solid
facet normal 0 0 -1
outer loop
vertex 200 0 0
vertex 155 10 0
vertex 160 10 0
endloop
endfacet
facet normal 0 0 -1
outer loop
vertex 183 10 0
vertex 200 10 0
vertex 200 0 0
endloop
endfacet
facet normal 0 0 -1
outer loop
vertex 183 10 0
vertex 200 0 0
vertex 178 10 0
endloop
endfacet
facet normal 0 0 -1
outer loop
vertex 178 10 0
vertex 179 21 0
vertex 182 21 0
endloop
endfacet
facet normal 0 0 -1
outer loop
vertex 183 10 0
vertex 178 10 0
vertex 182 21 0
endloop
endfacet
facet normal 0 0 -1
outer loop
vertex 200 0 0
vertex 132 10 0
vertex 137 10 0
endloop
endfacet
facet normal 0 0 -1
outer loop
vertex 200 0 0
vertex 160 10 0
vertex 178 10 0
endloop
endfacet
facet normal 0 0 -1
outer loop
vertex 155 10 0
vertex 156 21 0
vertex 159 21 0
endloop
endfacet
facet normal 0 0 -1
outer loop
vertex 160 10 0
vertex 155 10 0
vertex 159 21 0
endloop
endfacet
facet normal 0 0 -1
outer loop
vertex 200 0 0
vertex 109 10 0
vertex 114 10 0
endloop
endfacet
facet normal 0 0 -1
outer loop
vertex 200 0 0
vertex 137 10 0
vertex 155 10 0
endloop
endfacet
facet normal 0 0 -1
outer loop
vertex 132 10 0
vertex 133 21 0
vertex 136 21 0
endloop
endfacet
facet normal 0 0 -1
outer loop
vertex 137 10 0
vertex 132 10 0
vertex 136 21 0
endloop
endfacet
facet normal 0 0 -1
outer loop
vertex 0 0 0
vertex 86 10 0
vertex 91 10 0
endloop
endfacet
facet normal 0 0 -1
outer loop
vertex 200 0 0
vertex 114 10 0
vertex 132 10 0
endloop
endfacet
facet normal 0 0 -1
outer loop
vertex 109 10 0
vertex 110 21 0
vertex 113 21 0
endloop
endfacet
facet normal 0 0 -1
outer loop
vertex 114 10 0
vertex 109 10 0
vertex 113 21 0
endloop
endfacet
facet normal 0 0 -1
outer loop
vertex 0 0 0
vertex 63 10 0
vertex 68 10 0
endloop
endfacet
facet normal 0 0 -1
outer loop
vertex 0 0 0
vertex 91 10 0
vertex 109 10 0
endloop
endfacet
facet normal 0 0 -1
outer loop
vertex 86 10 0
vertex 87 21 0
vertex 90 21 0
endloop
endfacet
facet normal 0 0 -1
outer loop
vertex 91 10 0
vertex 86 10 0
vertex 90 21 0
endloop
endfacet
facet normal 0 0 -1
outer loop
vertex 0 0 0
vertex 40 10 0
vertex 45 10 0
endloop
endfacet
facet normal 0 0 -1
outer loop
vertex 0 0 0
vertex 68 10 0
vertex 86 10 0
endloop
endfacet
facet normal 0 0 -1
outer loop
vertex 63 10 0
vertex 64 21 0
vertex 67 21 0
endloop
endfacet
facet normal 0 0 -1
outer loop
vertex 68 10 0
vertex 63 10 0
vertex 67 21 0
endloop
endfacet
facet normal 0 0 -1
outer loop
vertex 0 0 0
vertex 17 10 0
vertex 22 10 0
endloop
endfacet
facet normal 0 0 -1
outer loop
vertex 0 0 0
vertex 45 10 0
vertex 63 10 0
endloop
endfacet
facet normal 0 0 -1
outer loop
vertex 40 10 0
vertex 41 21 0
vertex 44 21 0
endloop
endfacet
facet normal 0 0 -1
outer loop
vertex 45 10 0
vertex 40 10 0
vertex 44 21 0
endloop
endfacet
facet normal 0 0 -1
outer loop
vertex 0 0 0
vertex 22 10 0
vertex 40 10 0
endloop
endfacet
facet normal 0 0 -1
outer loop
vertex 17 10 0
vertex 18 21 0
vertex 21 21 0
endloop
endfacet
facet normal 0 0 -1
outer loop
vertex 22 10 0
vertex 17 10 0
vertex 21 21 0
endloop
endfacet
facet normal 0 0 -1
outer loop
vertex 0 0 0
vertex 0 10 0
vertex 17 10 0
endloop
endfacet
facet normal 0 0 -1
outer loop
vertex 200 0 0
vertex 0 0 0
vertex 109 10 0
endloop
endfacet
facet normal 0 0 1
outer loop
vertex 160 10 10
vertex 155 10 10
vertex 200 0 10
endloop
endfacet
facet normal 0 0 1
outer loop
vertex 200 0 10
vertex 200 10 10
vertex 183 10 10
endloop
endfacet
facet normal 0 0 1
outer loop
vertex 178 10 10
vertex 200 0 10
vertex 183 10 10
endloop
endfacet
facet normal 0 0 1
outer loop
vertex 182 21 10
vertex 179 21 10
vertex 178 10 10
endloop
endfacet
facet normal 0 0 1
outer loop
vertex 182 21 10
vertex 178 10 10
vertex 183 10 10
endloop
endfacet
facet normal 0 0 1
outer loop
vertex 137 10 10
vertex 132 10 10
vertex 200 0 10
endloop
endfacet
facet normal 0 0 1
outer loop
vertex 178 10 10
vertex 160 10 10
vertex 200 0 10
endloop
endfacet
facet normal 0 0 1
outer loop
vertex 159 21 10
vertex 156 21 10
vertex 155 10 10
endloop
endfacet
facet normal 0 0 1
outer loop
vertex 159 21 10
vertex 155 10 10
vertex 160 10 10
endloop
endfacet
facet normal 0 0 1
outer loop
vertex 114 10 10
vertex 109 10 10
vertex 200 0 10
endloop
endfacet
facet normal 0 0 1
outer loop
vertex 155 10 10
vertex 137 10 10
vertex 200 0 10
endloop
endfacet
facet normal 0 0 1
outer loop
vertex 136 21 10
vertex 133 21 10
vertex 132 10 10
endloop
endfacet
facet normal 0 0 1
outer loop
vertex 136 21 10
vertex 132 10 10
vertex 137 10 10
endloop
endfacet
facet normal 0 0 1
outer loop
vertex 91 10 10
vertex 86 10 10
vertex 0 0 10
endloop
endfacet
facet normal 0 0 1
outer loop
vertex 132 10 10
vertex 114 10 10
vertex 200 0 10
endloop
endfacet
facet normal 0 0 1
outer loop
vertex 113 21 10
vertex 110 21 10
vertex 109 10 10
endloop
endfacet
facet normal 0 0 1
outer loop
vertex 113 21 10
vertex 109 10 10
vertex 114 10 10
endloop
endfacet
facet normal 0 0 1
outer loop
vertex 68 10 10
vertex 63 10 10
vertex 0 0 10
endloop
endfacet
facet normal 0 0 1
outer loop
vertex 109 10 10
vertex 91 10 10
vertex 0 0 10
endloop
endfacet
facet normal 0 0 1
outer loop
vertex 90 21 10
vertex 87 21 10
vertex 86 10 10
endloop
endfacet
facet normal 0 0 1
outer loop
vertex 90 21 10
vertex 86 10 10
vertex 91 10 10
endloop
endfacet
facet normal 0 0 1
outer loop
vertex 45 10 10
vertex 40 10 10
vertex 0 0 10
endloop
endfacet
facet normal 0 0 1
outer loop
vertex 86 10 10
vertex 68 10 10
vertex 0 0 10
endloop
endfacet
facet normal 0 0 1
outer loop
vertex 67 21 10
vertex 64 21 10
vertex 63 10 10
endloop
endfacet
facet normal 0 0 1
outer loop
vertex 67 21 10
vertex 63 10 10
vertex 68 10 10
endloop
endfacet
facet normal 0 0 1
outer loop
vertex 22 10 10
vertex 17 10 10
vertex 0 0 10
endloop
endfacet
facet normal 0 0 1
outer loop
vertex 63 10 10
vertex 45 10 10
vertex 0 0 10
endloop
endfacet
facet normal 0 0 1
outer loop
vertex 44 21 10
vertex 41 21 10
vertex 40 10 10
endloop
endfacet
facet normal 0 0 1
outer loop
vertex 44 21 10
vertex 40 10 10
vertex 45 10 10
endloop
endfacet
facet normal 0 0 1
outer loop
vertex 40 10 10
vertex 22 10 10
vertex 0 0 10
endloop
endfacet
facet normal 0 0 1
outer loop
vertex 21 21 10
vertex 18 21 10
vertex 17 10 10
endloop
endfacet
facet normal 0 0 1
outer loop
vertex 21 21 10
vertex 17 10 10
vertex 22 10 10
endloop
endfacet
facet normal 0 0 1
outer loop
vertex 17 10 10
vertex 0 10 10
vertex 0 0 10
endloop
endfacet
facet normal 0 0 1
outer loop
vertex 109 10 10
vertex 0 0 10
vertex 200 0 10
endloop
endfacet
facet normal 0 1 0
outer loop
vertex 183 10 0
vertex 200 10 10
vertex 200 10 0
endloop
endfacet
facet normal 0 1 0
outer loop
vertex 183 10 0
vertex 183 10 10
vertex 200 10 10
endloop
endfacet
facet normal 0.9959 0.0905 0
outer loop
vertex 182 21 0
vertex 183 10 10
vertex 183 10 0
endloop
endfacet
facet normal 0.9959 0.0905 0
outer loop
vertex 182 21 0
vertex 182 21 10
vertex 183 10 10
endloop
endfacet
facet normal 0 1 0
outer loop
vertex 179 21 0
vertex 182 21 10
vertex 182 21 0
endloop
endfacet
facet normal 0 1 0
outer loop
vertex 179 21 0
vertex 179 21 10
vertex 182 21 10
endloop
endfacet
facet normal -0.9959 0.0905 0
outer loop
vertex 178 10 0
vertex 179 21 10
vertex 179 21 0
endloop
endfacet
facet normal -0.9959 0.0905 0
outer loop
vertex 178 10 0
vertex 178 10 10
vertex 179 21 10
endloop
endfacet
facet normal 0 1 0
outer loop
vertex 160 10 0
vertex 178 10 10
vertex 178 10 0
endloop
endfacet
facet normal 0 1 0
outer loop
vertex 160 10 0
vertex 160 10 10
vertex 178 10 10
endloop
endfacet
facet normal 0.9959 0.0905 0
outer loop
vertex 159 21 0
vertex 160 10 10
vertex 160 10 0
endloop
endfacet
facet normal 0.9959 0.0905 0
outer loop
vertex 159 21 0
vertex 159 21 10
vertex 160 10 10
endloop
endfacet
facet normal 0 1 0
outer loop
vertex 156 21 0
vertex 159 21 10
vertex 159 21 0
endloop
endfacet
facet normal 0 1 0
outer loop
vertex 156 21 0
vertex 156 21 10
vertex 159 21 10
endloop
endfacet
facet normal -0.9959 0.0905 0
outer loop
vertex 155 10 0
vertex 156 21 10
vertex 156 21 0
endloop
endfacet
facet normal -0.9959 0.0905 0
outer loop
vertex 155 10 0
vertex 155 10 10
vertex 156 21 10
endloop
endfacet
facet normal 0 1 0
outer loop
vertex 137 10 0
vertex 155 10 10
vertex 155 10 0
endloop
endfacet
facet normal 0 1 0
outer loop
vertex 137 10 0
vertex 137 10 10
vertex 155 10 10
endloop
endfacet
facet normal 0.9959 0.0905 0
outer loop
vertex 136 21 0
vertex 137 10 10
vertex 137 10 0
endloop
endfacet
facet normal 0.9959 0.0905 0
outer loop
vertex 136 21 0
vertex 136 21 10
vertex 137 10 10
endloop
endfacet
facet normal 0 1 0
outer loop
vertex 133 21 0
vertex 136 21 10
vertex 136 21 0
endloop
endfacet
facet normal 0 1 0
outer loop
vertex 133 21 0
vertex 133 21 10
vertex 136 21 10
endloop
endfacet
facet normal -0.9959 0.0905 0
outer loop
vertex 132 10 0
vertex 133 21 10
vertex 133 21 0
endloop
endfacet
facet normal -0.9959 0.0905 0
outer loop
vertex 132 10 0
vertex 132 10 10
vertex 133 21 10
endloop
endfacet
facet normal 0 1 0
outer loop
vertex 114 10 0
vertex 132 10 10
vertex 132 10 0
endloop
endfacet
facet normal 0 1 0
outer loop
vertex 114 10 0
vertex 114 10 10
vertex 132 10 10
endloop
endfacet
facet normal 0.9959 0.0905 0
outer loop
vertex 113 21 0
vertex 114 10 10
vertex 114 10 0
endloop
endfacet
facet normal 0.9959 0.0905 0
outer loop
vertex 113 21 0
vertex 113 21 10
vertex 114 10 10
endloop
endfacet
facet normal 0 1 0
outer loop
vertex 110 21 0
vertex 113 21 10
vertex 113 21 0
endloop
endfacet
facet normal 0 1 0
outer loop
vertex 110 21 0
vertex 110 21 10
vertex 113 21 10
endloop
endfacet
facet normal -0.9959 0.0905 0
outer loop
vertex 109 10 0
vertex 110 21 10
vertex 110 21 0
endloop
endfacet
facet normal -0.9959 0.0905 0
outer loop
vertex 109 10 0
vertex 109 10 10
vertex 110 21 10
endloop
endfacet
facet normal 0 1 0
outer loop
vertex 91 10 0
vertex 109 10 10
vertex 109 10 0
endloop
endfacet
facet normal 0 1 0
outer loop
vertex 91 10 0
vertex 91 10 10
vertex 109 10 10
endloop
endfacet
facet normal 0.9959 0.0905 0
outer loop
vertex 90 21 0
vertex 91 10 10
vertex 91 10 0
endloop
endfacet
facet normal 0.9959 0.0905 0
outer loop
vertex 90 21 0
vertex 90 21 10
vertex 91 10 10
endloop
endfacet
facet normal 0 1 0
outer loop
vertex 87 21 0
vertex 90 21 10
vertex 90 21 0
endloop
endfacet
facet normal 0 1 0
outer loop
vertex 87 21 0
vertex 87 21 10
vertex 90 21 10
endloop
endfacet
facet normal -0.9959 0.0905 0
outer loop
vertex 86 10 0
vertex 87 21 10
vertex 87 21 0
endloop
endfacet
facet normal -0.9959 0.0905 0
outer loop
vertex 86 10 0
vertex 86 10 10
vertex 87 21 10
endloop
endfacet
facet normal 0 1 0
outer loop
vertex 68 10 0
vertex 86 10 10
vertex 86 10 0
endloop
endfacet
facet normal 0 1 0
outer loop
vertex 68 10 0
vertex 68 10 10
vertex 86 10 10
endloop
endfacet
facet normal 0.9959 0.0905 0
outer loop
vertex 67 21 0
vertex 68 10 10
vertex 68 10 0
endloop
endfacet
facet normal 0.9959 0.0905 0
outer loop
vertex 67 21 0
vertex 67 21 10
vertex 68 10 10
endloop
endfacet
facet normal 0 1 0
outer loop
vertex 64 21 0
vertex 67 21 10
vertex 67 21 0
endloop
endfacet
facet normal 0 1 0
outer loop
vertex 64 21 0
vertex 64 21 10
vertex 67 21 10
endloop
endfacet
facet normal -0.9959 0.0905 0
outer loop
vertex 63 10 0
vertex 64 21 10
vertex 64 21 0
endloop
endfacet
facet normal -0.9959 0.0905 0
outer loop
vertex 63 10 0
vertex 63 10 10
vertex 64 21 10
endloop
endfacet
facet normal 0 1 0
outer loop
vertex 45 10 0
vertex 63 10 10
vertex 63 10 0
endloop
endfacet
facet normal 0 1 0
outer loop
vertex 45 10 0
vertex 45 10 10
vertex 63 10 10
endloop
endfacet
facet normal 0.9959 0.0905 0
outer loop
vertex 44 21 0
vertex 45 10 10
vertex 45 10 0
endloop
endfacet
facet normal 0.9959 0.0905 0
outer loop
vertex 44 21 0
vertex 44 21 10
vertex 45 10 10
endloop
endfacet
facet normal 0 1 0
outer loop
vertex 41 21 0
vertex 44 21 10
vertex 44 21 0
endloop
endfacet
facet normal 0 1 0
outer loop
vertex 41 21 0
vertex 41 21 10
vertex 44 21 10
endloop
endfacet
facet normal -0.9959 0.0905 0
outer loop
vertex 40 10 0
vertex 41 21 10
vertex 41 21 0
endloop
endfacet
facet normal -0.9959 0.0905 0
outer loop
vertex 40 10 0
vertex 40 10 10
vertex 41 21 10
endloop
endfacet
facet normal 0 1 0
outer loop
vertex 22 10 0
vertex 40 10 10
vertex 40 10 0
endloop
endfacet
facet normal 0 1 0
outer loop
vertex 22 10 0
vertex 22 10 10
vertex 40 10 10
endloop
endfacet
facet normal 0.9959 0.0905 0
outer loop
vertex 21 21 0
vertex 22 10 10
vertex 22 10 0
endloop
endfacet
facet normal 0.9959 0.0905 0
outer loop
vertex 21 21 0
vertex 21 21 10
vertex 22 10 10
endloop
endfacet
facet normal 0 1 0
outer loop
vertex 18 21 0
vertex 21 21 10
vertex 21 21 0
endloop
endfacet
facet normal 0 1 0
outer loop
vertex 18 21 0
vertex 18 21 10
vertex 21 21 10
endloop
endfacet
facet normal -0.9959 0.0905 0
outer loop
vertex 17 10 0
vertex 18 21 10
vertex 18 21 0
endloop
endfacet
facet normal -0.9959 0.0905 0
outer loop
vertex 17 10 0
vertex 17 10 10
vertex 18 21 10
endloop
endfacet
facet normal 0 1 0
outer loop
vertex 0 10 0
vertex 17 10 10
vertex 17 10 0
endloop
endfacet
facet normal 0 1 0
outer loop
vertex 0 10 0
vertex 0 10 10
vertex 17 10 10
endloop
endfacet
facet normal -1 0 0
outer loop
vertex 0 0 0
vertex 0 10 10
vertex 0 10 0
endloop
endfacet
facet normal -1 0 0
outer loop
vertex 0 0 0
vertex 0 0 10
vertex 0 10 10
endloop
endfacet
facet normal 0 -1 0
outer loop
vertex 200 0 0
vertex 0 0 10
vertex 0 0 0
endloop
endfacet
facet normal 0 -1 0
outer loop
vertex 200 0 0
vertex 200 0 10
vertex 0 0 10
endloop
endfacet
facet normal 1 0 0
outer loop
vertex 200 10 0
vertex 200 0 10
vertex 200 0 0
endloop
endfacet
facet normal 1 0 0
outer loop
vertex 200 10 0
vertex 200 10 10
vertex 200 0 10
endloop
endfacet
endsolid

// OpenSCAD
$fn = 32;

// ----------------------------------------------------------------------
// Gear rack: 8 teeth on a 200 mm bar, pitch 23 mm
// ----------------------------------------------------------------------

// --- parameters (mm) ---
profile_height = 10;      // extrusion height
profile_points = 36;      // points of the closed outline

profile = [[0, 0], [200, 0], [200, 10], [183, 10], [182, 21], [179, 21], [178, 10], [160, 10], [159, 21], [156, 21], [155, 10], [137, 10], [136, 21], [133, 21], [132, 10], [114, 10], [113, 21], [110, 21], [109, 10], [91, 10], [90, 21], [87, 21], [86, 10], [68, 10], [67, 21], [64, 21], [63, 10], [45, 10], [44, 21], [41, 21], [40, 10], [22, 10], [21, 21], [18, 21], [17, 10], [0, 10]];  // single closed polygon, 36 points, counter clockwise

// --- the one profile operation ---
linear_extrude(height = profile_height) polygon(points = profile);
